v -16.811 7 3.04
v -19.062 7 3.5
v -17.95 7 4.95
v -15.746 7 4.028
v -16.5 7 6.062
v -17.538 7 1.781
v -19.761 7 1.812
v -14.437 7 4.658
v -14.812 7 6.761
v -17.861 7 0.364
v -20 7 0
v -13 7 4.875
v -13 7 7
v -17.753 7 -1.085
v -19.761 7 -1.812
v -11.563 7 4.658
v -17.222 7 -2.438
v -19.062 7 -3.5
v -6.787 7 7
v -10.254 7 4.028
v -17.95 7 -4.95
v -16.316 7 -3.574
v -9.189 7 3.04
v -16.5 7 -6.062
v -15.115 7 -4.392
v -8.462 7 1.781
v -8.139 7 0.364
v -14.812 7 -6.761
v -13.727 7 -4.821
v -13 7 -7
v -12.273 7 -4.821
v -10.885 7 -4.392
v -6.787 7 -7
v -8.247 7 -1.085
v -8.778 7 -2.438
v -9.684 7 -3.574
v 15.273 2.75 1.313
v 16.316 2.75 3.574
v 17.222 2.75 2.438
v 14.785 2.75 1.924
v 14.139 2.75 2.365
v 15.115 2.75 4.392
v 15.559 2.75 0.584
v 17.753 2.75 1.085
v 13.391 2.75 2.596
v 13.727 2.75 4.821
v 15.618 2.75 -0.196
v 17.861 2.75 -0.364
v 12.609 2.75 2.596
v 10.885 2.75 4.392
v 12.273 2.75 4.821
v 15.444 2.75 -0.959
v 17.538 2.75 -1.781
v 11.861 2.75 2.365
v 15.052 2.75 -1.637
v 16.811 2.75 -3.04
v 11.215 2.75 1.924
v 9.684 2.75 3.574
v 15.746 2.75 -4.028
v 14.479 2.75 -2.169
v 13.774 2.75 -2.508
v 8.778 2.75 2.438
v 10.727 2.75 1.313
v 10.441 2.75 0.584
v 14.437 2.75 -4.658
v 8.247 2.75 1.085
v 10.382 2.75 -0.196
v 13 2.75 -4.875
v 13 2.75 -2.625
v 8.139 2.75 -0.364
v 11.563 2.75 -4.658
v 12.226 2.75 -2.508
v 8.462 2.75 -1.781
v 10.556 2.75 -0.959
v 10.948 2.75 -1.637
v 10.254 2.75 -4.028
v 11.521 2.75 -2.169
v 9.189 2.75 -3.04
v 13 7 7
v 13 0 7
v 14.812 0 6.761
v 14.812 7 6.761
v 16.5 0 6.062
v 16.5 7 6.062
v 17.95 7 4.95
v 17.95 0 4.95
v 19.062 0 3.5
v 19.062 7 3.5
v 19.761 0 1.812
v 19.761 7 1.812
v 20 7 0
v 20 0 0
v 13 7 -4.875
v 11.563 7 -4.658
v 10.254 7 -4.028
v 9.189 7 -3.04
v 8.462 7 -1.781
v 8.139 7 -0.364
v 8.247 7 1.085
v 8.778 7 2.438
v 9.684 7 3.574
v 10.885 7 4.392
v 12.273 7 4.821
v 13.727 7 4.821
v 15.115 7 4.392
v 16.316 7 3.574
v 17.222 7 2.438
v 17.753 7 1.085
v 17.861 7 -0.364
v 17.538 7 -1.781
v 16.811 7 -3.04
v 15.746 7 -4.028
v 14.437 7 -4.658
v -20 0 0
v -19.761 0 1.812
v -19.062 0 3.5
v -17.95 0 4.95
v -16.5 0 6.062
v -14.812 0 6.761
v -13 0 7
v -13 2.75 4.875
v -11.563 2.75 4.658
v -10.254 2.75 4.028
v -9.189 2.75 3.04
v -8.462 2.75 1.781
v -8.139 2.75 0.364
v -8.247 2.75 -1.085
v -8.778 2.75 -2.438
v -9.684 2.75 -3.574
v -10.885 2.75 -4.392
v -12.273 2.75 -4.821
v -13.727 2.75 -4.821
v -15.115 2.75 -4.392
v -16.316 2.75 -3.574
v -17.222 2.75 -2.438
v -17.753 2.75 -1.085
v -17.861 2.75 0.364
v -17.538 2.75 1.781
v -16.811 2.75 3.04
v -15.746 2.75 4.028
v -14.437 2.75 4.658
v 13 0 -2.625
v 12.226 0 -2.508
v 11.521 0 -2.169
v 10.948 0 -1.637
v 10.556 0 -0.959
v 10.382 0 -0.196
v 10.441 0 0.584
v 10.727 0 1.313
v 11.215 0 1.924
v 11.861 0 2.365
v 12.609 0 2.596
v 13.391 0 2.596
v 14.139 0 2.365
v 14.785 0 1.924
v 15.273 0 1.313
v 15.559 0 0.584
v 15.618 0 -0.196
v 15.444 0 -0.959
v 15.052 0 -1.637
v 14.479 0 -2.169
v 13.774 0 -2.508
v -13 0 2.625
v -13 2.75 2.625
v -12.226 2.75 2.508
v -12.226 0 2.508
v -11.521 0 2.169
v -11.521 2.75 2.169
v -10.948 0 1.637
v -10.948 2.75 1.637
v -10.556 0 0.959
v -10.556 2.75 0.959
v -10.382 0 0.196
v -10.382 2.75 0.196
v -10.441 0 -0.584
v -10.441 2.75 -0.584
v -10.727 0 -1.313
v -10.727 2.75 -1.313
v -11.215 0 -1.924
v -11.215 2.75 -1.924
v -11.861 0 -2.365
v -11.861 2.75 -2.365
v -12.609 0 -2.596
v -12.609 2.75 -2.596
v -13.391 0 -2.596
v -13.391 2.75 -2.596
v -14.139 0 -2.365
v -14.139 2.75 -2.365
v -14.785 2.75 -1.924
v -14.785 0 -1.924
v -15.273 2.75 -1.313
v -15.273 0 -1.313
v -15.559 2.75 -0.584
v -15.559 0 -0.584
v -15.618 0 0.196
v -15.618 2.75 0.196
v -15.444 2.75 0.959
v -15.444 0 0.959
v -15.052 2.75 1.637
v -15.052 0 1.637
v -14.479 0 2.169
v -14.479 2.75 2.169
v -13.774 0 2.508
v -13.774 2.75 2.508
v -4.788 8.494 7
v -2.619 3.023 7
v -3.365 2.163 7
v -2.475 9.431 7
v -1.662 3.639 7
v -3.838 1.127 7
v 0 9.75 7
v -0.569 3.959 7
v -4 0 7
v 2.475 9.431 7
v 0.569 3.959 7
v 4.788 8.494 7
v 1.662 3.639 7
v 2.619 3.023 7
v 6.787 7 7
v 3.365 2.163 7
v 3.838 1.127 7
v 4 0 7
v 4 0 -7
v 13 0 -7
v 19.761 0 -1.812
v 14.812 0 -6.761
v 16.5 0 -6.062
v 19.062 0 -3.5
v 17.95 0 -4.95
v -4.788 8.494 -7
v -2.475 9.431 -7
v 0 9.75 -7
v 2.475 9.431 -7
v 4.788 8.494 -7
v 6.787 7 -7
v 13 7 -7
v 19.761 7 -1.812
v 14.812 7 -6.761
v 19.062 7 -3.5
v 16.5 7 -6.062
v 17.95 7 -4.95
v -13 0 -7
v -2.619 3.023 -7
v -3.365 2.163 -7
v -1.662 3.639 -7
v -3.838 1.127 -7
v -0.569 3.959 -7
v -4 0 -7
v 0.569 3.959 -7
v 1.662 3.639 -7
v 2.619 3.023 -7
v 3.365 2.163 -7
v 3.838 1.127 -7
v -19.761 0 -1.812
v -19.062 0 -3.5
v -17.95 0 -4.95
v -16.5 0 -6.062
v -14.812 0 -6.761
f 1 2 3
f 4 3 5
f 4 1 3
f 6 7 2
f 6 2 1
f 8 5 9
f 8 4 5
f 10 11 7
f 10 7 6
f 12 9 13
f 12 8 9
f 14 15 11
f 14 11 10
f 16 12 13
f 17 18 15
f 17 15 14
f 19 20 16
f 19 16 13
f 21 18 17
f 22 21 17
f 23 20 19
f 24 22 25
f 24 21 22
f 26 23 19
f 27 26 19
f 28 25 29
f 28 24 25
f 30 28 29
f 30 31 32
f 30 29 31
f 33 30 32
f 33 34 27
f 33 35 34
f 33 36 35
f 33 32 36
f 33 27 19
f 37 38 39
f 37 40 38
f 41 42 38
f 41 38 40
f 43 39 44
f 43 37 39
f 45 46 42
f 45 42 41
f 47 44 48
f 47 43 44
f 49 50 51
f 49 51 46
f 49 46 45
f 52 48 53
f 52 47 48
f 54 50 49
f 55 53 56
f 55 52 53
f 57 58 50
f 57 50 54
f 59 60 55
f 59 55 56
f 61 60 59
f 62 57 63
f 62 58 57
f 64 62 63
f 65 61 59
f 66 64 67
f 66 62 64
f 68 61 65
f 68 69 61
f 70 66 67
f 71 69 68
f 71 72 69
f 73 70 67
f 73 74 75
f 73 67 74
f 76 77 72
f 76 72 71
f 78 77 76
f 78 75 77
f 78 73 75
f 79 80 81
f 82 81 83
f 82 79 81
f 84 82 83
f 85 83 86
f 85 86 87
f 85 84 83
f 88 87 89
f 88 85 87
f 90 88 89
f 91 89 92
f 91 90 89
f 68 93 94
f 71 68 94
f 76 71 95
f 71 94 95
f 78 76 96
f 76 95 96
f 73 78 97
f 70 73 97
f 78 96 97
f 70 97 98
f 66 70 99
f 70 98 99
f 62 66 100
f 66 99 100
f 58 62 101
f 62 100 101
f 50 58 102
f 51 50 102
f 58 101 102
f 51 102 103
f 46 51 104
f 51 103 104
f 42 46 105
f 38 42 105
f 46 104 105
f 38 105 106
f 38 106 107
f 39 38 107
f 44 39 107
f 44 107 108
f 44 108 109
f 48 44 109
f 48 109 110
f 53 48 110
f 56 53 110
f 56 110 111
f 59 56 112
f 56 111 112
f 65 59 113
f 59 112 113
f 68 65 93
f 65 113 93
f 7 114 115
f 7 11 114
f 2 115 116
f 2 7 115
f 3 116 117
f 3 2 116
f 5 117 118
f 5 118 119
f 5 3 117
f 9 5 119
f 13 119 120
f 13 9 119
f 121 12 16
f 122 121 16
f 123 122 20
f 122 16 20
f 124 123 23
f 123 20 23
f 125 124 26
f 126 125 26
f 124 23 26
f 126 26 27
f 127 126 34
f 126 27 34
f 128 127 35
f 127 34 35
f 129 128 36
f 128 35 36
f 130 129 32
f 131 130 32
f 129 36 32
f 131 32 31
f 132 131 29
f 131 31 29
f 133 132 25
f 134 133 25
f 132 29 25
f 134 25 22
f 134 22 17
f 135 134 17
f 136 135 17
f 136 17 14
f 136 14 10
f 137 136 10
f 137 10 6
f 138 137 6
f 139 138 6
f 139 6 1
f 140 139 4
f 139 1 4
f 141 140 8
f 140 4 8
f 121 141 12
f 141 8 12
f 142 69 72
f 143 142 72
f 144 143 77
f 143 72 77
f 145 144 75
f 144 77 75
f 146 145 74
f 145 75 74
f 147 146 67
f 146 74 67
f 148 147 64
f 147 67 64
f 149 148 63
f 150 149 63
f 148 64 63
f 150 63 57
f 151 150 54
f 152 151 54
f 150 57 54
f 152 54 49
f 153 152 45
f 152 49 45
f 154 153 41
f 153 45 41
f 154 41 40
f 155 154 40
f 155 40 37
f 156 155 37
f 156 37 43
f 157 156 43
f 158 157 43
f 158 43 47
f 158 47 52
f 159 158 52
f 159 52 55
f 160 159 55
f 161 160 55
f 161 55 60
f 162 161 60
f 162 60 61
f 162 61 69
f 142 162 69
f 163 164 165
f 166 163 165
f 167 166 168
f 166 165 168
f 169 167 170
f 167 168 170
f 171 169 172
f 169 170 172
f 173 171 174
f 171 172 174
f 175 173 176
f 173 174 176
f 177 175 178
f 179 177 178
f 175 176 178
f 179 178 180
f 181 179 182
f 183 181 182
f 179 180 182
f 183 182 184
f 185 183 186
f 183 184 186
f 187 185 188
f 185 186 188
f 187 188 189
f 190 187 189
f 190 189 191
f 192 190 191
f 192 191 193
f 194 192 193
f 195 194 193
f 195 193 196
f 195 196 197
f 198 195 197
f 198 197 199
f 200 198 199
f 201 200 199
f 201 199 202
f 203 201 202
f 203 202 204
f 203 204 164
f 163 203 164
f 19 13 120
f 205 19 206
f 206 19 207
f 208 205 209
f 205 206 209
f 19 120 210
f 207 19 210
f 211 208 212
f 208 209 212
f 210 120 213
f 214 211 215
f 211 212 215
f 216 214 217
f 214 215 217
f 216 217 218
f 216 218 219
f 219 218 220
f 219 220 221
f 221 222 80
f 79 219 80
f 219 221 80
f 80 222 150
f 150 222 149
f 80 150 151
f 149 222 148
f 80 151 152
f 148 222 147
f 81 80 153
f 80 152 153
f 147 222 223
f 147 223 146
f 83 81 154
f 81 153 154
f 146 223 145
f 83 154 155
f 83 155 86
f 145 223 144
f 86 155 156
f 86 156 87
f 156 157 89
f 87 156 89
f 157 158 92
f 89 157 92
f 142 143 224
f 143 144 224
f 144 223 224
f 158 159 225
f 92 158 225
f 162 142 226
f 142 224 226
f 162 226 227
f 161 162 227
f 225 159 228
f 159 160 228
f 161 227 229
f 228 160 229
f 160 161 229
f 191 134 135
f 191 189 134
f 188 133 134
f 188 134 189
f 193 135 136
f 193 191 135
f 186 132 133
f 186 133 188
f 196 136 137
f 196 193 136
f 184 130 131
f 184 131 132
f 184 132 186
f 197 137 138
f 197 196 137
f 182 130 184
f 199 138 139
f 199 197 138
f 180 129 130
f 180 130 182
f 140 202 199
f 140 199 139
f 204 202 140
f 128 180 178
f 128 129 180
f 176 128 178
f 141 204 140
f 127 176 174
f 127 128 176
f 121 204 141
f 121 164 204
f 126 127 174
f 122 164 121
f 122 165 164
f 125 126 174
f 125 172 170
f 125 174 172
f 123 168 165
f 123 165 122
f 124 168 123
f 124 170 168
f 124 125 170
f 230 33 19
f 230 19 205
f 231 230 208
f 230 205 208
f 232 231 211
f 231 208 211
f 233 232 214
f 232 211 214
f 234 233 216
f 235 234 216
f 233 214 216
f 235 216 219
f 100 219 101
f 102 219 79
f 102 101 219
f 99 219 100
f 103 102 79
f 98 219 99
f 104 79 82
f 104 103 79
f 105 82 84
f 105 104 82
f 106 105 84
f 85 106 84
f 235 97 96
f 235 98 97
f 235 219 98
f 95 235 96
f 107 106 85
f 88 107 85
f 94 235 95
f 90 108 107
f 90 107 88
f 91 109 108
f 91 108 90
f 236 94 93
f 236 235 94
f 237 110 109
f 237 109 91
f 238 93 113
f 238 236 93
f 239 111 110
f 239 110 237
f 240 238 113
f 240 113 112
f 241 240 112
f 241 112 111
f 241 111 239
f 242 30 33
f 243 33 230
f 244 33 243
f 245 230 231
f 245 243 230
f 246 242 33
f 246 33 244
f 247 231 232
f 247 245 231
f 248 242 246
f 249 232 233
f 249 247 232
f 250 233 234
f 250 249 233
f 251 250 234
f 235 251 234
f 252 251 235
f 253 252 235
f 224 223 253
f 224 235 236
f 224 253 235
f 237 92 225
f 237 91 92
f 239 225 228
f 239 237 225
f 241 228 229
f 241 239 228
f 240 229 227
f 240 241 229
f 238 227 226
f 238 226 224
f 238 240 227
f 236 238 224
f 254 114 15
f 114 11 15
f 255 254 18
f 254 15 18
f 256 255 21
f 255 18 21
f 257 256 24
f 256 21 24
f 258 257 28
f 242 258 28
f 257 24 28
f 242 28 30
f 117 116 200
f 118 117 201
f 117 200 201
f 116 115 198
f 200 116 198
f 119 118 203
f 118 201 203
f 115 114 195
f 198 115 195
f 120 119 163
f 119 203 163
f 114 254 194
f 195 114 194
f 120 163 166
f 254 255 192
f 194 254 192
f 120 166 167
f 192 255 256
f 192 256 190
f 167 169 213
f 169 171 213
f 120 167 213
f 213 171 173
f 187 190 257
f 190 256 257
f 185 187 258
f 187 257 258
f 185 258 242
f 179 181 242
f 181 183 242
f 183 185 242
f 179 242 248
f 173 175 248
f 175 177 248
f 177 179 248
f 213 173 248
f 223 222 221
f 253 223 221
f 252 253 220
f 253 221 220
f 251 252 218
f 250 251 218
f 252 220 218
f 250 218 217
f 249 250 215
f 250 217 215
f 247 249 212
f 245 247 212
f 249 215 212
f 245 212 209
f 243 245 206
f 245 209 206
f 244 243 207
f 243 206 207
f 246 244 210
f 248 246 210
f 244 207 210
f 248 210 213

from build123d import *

# Parameters (mm, degrees)
SKETCH1_W           = 40
SKETCH1_H           = 14
BOSS_EXTRUDE1_DEPTH = 7
FILLET1_R           = 7
SKETCH2_R           = 2.625
CUT_EXTRUDE1_DEPTH  = 23.315913604
SKETCH3_R           = 4.875
CUT_EXTRUDE2_DEPTH  = 4.25
BOSS_EXTRUDE2_DEPTH = 14
SKETCH5_R           = 4
CUT_EXTRUDE3_DEPTH  = 27.288067635


with BuildPart() as part:
    # Sketch1 → Boss-Extrude1 (new body)
    with BuildSketch(Plane(origin=(0, 0, 0), x_dir=(1, 0, 0), z_dir=(0, 1, 0))):
        Rectangle(SKETCH1_W, SKETCH1_H)
    extrude(amount=BOSS_EXTRUDE1_DEPTH)

    # Fillet1
    fillet1_edges = [part.edges().sort_by_distance(p)[0] for p in [
        (-20, 3.5, 7),
        (20, 3.5, 7),
        (20, 3.5, -7),
        (-20, 3.5, -7),
    ]]
    fillet(fillet1_edges, radius=FILLET1_R - 0.0001)  # a hair under: the kernel refuses the full size

    # Sketch2 → Cut-Extrude1 (cut, through all)
    with BuildSketch(Plane(origin=(0, 7, 0), x_dir=(1, 0, 0), z_dir=(0, 1, 0))):
        with Locations(Location((-13, 0, 0), (0, 0, 270))):
            Circle(SKETCH2_R)
        with Locations(Location((13, 0, 0), (0, 0, 90))):
            Circle(SKETCH2_R)
    extrude(amount=-CUT_EXTRUDE1_DEPTH, mode=Mode.SUBTRACT)

    # Sketch3 → Cut-Extrude2 (cut)
    with BuildSketch(Plane(origin=(0, 7, 0), x_dir=(1, 0, 0), z_dir=(0, 1, 0))):
        with Locations(Location((-13, 0, 0), (0, 0, 270))):
            Circle(SKETCH3_R)
        with Locations(Location((13, 0, 0), (0, 0, 90))):
            Circle(SKETCH3_R)
    extrude(amount=-CUT_EXTRUDE2_DEPTH, mode=Mode.SUBTRACT)

    # Sketch4 → Boss-Extrude2 (add)
    with BuildSketch(Plane.XY.offset(7)):
        with BuildLine():
            Line((6.78693598, 7), (-6.78693598, 7))
            ThreePointArc((-6.78693598, 7), (0, 9.75), (6.78693598, 7))
        make_face()
    extrude(amount=-BOSS_EXTRUDE2_DEPTH)

    # Sketch5 → Cut-Extrude3 (cut, through all)
    with BuildSketch(Plane.XY.offset(7)):
        Circle(SKETCH5_R)
    extrude(amount=-CUT_EXTRUDE3_DEPTH, mode=Mode.SUBTRACT)


solid = part.part
